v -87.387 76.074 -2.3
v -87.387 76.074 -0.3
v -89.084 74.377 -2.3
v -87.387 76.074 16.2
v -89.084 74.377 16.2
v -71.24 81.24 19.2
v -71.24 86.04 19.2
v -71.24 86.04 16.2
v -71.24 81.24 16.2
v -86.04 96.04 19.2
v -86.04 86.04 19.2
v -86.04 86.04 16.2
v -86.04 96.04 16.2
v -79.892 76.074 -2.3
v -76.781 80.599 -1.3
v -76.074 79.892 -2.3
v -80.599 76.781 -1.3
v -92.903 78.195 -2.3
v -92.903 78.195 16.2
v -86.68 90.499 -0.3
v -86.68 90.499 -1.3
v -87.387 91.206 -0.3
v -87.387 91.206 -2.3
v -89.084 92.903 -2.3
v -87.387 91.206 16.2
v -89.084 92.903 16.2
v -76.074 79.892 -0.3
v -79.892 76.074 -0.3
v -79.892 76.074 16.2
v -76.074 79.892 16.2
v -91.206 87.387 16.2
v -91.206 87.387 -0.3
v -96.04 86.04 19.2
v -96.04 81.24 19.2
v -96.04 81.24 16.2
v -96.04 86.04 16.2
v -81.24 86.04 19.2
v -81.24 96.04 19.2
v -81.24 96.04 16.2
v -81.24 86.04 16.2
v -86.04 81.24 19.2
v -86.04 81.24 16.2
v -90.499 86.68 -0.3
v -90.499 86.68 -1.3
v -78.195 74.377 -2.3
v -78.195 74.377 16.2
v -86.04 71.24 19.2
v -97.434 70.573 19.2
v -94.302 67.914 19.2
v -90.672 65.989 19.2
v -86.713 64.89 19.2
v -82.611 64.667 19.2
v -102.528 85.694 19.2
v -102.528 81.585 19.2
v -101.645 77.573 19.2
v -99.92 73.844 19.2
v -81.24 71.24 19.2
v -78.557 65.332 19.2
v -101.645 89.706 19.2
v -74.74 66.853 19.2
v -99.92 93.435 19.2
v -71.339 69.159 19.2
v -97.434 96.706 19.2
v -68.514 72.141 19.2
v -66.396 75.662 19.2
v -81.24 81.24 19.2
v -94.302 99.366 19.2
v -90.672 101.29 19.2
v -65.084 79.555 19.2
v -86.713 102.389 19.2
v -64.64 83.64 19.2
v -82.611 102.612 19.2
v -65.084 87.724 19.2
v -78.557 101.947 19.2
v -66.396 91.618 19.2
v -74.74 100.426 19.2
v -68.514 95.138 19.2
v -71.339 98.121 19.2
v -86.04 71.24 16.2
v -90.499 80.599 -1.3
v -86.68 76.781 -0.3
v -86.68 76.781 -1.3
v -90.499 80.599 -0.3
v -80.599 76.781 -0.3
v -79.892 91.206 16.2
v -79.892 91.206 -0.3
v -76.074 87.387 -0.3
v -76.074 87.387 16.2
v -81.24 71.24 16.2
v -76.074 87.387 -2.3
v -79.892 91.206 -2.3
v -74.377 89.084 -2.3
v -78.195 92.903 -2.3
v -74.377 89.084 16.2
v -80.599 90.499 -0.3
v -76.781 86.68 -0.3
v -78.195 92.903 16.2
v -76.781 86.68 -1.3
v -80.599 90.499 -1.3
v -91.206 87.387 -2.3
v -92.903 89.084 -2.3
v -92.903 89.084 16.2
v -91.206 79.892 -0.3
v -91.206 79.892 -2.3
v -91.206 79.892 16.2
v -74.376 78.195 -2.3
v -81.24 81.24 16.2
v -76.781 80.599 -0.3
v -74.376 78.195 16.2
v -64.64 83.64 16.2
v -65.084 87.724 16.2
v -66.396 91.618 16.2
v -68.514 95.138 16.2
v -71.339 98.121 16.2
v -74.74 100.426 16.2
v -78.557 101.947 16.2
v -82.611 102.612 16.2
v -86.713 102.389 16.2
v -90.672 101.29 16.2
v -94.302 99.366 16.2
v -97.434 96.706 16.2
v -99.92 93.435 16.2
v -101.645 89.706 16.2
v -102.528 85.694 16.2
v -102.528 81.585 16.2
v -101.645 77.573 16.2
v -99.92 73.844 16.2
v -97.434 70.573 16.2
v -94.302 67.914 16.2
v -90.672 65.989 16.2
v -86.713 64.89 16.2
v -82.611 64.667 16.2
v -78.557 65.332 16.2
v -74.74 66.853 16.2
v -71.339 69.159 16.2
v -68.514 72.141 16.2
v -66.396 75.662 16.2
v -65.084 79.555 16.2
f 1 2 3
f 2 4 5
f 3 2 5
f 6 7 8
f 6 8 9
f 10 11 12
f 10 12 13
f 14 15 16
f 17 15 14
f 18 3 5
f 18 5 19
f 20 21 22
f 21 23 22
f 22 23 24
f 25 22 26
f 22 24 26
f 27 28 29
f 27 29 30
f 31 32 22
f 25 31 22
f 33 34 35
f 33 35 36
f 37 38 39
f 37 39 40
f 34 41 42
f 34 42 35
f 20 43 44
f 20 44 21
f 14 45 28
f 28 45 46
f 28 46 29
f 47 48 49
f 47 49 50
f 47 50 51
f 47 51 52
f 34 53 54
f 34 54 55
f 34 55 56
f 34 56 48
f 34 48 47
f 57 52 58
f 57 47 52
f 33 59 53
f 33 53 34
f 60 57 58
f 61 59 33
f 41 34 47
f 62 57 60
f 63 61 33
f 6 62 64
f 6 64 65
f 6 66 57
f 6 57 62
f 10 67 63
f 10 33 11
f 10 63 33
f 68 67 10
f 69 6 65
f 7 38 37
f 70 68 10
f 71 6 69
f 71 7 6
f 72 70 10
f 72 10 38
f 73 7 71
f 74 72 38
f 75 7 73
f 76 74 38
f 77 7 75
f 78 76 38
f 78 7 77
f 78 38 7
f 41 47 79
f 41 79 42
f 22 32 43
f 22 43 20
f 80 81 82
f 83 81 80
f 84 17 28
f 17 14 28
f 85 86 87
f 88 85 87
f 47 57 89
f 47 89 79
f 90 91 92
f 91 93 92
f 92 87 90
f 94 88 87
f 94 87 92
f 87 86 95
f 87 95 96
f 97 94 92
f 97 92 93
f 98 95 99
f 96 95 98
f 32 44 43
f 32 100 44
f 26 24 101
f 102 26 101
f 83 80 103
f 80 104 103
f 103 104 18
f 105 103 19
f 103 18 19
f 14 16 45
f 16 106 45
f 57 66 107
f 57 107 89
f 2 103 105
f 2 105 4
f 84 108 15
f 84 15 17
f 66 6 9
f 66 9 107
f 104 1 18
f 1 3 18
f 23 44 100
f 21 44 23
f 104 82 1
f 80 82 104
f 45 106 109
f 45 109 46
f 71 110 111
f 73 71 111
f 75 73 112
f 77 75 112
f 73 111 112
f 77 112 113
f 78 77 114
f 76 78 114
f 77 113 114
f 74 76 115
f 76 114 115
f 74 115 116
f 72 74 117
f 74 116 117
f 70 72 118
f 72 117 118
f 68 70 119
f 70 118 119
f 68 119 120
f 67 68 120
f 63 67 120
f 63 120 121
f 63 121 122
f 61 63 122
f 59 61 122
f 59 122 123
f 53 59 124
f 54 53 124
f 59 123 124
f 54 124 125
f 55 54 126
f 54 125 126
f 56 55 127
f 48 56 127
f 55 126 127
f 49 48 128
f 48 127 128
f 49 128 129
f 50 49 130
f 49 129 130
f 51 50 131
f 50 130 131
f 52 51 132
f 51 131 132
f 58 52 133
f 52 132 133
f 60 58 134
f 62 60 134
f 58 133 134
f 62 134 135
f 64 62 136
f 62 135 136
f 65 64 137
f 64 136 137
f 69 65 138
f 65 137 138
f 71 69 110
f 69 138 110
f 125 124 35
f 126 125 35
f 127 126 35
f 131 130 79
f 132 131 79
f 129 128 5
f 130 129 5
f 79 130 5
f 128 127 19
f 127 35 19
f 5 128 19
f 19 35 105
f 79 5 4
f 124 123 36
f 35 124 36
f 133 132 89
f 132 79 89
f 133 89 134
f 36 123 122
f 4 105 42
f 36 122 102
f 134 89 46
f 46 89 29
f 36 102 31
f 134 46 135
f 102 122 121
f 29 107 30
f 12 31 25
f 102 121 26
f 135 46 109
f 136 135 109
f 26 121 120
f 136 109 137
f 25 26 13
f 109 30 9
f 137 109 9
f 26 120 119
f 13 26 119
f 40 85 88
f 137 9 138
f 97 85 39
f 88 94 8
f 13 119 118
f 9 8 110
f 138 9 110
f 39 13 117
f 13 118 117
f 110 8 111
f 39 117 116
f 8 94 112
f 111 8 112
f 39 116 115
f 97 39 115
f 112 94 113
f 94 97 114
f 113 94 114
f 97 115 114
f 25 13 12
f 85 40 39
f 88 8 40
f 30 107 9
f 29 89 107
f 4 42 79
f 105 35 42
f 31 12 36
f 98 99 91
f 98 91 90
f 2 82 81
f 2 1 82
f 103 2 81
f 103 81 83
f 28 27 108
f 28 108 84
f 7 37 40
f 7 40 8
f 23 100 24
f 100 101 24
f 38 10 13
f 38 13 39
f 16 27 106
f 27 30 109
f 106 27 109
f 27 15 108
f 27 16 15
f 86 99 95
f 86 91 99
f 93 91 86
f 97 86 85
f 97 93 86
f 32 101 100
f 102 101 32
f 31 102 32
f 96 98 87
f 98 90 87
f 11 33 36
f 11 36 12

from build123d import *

# Parameters (mm, degrees)
SKETCH043_R     = 19
PAD026_DEPTH    = 3
PAD027_DEPTH    = 18.5
SKETCH045_W     = 5.4
SKETCH045_H     = 2
PAD028_DEPTH    = 1
SKETCH046_W     = 5.4
SKETCH046_H     = 2
PAD029_DEPTH    = 1
SKETCH047_W     = 5.4
SKETCH047_H     = 2
PAD030_DEPTH    = 1
SKETCH048_W     = 5.4
SKETCH048_H     = 2
PAD031_DEPTH    = 1
POCKET017_DEPTH = 5
CHAMFER_SIZE    = 1
CHAMFER001_SIZE = 1
CHAMFER002_SIZE = 1
CHAMFER003_SIZE = 1


with BuildPart() as part:
    # Sketch043 (on Face61 of Binder008) → Pad026 (new body)
    with BuildSketch(Plane.XY.offset(16.2)):
        with Locations((-83.63961, 83.63961)):
            Circle(SKETCH043_R)
    extrude(amount=PAD026_DEPTH)

    # Sketch044 (on Face2 of Pad026) → Pad027 (join)
    with BuildSketch(Plane(origin=(0, 0, 16.2), x_dir=(1, 0, 0), z_dir=(0, 0, -1))):
        Polygon((-92.9027091403, -78.1948880917), (-91.2056528655, -79.8919443665), (-87.3872762471, -76.0735677481), (-89.0843325219, -74.3765114732), align=None)
        Polygon((-79.8919443665, -76.0735677481), (-76.0735677481, -79.8919443665), (-74.3764965771, -78.1949029878), (-78.1948880917, -74.3765114732), align=None)
        Polygon((-92.9027199513, -89.0843217109), (-91.2056528655, -87.3872762471), (-87.3872762471, -91.2056528655), (-89.0843325219, -92.9027091403), align=None)
        Polygon((-79.8919443665, -91.2056528655), (-76.0735677481, -87.3872762471), (-74.3765262449, -89.0843472936), (-78.1948880917, -92.9027091403), align=None)
    extrude(amount=PAD027_DEPTH)

    # Sketch045 (on Face6 of Pad027) → Pad028 (join)
    with BuildSketch(Plane(origin=(-5.6568542495, -5.6568542495, 0), x_dir=(-0.7071067812, 0.7071067812, 0), z_dir=(0.7071067812, 0.7071067812, 0))):
        with Locations((118.2842712475, -1.3)):
            Rectangle(SKETCH045_W, SKETCH045_H)
    extrude(amount=PAD028_DEPTH)

    # Sketch046 (on Face11 of Pad028) → Pad029 (join)
    with BuildSketch(Plane(origin=(-89.2964645563, 89.2964645563, 0), x_dir=(0.7071067812, 0.7071067812, 0), z_dir=(0.7071067812, -0.7071067812, 0))):
        with Locations((0, -1.3)):
            Rectangle(SKETCH046_W, SKETCH046_H)
    extrude(amount=PAD029_DEPTH)

    # Sketch047 (on Face11 of Pad029) → Pad030 (join)
    with BuildSketch(Plane(origin=(-77.9827560573, 77.9827560573, 0), x_dir=(-0.7071067812, -0.7071067812, 0), z_dir=(-0.7071067812, 0.7071067812, 0))):
        with Locations((0, -1.3)):
            Rectangle(SKETCH047_W, SKETCH047_H)
    extrude(amount=PAD030_DEPTH)

    # Sketch048 (on Face15 of Pad030) → Pad031 (join)
    with BuildSketch(Plane(origin=(5.6568542495, 5.6568542495, 0), x_dir=(0.7071067812, -0.7071067812, 0), z_dir=(-0.7071067812, -0.7071067812, 0))):
        with Locations((-118.2842712475, -1.3)):
            Rectangle(SKETCH048_W, SKETCH048_H)
    extrude(amount=PAD031_DEPTH)

    # Sketch049 (on Face3 of Pad031) → Pocket017 (cut)
    with BuildSketch(Plane.XY.offset(19.2)):
        Polygon((-86.0396103068, 96.0396103068), (-81.2396103068, 96.0396103068), (-81.2396103068, 86.0396103068), (-71.2396103068, 86.0396103068), (-71.2396103068, 81.2396103068), (-81.2396103068, 81.2396103068), (-81.2396103068, 71.2396103068), (-86.0396103068, 71.2396103068), (-86.0396103068, 81.2396103068), (-96.0396103068, 81.2396103068), (-96.0396103068, 86.0396103068), (-86.0396103068, 86.0396103068), align=None)
    extrude(amount=-POCKET017_DEPTH, mode=Mode.SUBTRACT)

    # Chamfer
    chamfer_edges = [part.edges().sort_by_distance(p)[0] for p in [
        (-88.589358, 88.589358, -2.3),
    ]]
    chamfer(chamfer_edges, length=CHAMFER_SIZE)

    # Chamfer001
    chamfer001_edges = [part.edges().sort_by_distance(p)[0] for p in [
        (-78.689863, 88.589358, -2.3),
    ]]
    chamfer(chamfer001_edges, length=CHAMFER001_SIZE)

    # Chamfer002
    chamfer002_edges = [part.edges().sort_by_distance(p)[0] for p in [
        (-88.589358, 78.689863, -2.3),
    ]]
    chamfer(chamfer002_edges, length=CHAMFER002_SIZE)

    # Chamfer003
    chamfer003_edges = [part.edges().sort_by_distance(p)[0] for p in [
        (-78.689863, 78.689863, -2.3),
    ]]
    chamfer(chamfer003_edges, length=CHAMFER003_SIZE)


solid = part.part
